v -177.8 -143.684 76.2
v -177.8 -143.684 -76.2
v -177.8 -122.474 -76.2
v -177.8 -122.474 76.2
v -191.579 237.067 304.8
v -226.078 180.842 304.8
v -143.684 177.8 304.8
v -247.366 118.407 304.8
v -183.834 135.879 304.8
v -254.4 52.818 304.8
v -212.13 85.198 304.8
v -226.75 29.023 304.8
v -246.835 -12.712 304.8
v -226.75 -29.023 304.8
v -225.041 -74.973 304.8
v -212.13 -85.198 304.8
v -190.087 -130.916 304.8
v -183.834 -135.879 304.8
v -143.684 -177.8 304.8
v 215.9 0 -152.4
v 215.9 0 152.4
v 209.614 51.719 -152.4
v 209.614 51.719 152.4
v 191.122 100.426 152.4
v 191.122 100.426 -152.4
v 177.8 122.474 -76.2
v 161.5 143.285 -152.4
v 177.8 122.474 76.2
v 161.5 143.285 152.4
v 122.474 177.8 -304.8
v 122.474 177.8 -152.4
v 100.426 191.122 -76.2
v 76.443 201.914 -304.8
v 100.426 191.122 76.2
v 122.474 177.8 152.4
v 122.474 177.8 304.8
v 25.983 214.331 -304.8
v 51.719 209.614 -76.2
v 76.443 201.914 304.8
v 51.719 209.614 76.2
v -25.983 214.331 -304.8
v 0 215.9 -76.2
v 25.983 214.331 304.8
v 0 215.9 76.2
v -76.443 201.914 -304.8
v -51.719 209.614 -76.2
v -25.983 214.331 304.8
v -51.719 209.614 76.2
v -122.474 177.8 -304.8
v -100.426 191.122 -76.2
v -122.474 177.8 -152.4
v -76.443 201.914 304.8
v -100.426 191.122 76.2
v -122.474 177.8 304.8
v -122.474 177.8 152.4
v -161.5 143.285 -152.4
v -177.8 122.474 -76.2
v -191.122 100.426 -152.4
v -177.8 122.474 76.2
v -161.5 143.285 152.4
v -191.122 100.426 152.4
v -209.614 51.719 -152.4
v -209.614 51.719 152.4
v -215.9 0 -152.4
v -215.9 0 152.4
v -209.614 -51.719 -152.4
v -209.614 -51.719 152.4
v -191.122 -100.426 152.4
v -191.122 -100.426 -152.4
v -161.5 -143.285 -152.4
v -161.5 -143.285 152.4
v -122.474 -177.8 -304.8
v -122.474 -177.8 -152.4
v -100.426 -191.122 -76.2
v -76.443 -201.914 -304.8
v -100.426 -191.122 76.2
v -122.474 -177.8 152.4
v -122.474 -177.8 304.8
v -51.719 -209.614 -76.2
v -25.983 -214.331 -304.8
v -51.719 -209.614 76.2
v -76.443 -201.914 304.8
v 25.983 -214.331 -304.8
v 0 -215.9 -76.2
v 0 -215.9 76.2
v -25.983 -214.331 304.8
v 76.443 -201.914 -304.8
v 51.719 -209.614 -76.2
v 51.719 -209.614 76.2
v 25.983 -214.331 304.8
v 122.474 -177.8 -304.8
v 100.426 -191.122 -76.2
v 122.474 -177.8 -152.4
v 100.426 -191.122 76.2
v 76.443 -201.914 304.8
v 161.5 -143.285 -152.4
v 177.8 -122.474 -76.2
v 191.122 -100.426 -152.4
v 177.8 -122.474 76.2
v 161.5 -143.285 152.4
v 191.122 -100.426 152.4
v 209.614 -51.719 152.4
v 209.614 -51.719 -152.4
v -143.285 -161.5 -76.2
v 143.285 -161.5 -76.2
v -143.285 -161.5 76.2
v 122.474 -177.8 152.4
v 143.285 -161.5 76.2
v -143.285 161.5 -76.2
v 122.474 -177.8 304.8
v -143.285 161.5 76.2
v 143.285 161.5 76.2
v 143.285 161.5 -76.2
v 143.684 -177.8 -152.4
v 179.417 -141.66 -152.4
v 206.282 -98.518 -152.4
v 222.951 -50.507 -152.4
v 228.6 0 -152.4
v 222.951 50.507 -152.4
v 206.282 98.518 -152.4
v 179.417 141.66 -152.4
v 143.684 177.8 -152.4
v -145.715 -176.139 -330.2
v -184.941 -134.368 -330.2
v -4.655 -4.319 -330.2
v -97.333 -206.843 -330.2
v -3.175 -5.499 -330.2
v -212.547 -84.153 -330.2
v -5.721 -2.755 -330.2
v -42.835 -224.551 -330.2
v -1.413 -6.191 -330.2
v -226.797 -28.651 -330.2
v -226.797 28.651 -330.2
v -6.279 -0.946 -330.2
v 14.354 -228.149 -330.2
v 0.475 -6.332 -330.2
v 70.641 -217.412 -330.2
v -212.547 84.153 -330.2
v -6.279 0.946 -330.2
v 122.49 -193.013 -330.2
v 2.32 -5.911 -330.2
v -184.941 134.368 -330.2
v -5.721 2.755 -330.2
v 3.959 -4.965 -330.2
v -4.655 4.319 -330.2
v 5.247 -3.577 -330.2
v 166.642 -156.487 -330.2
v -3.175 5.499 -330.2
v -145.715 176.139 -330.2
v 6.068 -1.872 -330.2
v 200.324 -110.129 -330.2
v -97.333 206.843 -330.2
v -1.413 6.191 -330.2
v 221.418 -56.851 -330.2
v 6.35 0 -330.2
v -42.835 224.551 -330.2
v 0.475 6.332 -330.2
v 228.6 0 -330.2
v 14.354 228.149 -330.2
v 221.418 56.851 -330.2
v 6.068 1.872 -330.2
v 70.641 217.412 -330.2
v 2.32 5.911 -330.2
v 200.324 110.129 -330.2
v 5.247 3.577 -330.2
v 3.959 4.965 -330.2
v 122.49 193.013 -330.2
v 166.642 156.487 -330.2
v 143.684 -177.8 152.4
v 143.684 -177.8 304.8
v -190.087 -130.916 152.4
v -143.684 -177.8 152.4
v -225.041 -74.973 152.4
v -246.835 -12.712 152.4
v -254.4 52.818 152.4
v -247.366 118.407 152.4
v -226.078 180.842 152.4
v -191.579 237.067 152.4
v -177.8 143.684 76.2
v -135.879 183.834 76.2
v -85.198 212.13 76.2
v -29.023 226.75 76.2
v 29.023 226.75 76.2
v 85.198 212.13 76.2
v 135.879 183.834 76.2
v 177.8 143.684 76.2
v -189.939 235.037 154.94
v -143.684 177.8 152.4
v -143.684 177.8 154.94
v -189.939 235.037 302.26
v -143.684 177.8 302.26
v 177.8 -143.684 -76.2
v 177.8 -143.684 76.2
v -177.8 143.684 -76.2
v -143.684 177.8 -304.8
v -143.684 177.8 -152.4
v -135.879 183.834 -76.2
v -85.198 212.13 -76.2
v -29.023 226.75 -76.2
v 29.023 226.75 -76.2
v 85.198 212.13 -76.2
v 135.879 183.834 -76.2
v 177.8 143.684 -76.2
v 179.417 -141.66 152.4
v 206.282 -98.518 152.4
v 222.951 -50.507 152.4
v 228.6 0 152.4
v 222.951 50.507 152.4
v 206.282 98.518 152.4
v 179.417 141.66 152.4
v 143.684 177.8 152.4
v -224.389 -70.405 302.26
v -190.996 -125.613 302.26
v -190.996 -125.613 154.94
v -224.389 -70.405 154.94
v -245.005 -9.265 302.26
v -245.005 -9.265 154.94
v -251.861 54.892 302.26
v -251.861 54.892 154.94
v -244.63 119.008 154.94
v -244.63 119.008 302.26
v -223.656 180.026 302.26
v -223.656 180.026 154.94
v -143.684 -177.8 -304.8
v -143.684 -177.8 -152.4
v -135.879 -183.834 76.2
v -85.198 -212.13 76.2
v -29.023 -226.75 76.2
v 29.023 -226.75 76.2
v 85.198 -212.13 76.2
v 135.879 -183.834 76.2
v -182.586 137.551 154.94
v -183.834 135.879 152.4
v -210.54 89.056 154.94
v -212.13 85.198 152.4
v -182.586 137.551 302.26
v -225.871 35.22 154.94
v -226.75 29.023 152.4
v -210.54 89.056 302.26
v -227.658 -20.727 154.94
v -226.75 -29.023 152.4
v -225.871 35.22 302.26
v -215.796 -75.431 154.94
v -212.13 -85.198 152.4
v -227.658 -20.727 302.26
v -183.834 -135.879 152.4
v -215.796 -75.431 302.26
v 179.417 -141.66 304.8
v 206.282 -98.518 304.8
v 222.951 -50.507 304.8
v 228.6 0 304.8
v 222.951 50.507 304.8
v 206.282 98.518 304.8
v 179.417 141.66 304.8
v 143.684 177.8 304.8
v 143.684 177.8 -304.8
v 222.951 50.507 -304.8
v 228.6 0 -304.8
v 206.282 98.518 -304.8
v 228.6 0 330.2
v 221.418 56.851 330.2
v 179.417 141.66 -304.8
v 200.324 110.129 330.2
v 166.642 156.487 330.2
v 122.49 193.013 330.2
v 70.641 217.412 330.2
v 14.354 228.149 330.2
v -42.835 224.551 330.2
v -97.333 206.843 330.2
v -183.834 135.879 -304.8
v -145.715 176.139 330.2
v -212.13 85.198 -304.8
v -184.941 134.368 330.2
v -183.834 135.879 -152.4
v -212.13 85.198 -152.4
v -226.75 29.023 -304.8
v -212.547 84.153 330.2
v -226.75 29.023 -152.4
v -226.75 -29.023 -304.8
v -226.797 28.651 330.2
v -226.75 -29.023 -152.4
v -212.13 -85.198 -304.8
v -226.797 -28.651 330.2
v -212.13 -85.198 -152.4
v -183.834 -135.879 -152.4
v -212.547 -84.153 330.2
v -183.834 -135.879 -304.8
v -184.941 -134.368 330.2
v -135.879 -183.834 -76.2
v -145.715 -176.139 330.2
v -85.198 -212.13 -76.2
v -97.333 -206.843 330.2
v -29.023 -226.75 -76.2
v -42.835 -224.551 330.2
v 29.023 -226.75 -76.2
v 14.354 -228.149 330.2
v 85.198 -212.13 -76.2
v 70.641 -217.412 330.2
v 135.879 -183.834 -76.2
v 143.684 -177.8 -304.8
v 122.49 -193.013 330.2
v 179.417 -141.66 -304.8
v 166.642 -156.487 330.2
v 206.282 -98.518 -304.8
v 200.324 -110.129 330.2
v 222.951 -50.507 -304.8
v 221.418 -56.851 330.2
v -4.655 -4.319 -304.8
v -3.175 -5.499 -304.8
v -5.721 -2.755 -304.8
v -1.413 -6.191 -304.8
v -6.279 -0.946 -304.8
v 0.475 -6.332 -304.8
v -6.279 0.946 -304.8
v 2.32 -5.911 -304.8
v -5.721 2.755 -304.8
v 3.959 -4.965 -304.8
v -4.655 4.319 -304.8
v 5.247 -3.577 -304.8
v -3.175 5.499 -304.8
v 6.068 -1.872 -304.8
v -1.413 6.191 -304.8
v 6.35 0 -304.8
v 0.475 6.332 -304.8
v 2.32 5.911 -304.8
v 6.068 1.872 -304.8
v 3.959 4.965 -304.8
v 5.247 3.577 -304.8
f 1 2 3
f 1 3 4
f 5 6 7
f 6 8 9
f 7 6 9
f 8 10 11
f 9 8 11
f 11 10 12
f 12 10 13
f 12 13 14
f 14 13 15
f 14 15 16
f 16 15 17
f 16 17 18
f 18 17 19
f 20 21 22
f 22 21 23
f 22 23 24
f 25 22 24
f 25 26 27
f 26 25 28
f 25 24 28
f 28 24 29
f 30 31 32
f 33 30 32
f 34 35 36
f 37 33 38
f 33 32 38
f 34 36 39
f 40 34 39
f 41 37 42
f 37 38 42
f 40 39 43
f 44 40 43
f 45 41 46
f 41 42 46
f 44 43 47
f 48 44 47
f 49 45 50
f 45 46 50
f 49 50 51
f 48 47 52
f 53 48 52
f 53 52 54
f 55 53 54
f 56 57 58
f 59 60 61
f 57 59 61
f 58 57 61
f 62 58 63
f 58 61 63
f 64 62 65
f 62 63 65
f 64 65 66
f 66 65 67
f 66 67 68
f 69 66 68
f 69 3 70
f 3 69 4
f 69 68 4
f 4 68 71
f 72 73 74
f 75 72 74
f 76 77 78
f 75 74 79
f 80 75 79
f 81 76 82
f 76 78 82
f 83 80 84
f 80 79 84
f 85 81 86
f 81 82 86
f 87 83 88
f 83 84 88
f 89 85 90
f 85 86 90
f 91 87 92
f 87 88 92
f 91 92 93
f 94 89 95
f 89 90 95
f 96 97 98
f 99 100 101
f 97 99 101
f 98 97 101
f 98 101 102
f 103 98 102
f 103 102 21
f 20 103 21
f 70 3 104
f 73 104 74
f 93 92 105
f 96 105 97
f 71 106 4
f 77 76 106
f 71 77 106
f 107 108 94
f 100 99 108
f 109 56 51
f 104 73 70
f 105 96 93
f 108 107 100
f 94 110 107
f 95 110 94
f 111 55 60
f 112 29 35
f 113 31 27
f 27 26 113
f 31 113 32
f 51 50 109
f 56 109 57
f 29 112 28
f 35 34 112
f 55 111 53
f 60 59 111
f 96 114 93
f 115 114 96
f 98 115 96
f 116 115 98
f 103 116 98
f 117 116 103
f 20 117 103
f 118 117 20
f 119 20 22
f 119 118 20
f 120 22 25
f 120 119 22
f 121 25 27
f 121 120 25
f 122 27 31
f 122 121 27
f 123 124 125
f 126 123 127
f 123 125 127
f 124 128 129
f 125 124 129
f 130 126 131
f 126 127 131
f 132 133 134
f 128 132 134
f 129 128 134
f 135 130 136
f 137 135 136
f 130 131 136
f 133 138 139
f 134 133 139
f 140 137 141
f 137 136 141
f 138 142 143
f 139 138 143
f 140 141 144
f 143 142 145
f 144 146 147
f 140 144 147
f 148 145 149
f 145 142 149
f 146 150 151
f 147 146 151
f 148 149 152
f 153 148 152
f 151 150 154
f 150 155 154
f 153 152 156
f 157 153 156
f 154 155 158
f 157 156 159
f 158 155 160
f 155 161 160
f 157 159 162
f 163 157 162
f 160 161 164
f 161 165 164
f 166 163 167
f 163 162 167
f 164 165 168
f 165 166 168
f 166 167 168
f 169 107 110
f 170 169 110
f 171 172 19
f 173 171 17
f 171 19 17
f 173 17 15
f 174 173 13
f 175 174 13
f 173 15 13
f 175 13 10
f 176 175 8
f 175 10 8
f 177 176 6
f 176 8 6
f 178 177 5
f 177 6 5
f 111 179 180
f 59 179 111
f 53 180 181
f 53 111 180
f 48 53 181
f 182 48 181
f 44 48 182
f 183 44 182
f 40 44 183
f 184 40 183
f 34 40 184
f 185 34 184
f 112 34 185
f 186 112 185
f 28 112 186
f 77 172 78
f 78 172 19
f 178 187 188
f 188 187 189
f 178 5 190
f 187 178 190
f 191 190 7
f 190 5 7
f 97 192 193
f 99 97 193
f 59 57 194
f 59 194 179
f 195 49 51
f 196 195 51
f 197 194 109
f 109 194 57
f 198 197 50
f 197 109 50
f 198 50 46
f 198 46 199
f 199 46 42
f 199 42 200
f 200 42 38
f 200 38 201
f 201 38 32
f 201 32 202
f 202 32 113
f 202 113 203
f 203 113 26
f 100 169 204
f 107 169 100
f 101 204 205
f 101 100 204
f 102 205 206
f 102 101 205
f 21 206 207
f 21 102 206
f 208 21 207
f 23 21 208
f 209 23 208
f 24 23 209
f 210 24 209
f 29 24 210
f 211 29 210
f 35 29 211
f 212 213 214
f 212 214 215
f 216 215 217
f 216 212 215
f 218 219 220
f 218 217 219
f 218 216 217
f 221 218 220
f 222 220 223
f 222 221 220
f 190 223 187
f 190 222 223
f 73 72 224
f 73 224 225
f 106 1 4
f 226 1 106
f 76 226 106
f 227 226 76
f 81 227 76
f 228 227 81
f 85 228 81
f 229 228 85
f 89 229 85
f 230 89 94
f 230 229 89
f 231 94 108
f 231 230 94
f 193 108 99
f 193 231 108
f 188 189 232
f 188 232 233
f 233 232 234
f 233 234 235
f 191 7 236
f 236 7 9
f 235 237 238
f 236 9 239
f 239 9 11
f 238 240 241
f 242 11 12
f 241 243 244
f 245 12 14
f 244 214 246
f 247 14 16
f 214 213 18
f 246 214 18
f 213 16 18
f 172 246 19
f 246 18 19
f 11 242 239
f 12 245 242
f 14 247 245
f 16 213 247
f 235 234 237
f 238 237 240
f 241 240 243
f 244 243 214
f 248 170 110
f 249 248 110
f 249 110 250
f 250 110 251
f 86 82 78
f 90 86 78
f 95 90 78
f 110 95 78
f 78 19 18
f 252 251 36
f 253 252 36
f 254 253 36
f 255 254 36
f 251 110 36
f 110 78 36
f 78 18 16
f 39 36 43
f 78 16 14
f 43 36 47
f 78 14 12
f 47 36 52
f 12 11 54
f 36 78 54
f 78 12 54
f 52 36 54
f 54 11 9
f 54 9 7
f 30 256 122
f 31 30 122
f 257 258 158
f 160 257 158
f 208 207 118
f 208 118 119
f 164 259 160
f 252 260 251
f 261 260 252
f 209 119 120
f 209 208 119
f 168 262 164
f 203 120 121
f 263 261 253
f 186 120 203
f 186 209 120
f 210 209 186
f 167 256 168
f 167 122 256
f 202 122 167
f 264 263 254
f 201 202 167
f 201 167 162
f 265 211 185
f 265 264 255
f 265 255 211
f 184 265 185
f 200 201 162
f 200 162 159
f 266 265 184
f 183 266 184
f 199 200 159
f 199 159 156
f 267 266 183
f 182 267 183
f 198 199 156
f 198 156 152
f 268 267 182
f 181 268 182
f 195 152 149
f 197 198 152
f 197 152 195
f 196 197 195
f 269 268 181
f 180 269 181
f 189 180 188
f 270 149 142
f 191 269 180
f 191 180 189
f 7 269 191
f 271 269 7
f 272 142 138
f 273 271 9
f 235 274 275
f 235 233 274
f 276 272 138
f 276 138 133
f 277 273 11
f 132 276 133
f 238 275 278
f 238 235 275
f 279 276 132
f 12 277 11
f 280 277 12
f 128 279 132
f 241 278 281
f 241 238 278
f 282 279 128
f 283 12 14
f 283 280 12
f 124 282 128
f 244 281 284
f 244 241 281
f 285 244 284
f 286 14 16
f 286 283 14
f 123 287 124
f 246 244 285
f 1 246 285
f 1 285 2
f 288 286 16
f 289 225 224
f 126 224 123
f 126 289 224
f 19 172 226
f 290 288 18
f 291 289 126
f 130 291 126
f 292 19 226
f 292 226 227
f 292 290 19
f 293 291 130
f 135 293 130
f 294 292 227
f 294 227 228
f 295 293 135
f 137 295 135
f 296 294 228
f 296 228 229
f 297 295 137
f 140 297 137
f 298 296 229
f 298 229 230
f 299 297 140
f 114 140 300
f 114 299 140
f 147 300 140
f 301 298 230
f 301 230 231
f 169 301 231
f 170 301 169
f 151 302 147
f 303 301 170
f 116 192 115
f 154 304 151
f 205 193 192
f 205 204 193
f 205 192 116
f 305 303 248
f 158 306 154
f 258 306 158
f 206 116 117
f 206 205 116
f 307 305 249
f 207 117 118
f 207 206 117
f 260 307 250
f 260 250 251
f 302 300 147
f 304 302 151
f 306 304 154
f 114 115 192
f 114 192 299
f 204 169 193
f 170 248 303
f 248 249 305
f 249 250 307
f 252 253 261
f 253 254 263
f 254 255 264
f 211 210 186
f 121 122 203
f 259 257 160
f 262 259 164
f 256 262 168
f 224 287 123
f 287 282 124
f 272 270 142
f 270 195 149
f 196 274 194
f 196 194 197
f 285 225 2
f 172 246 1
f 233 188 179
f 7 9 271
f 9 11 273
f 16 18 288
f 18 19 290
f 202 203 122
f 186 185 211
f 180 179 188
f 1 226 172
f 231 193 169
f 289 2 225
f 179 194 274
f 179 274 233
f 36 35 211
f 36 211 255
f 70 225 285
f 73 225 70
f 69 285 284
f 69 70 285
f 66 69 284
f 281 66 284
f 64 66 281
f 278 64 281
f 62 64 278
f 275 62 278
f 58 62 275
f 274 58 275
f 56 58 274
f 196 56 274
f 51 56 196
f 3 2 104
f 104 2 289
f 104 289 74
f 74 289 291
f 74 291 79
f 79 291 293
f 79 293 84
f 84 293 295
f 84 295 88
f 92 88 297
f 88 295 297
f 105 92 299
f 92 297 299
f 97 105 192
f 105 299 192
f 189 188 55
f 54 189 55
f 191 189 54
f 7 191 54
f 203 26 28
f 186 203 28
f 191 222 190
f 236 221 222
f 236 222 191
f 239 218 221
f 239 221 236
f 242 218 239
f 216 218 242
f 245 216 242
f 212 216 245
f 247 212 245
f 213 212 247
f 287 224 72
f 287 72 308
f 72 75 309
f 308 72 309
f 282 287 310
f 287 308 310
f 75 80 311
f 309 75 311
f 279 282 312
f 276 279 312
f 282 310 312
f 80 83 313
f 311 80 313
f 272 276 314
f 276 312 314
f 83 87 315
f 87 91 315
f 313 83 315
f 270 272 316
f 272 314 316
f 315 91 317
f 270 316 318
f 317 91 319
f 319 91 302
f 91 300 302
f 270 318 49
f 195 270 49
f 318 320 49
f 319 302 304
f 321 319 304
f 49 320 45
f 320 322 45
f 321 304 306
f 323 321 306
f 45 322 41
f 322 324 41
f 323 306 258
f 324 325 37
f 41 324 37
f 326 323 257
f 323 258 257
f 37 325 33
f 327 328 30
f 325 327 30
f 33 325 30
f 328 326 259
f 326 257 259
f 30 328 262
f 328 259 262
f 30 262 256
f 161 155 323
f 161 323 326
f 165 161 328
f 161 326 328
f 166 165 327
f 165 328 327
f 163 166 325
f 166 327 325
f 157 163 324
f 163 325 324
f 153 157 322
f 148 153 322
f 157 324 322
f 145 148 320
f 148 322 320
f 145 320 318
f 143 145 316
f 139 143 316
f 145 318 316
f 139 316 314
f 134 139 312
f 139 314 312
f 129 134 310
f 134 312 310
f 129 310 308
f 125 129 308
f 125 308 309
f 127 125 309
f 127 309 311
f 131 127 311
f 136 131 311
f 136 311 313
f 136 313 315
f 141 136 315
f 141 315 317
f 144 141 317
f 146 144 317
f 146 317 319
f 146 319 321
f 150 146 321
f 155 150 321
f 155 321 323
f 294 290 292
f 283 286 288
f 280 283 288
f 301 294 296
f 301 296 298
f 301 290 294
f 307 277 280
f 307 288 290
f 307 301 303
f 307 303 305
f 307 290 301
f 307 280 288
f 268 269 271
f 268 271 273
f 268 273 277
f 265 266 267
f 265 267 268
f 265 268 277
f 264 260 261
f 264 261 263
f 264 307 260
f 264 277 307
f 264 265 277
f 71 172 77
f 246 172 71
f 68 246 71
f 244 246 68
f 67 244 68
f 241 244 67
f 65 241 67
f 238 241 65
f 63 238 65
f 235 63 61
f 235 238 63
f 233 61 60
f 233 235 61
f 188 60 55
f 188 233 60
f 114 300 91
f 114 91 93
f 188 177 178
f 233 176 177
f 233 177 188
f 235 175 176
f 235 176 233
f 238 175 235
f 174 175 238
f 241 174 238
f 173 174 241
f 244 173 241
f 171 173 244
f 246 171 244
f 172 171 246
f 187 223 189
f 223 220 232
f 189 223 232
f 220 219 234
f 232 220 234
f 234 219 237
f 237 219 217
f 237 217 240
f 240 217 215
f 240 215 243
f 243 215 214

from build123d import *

# Parameters (mm, degrees)
F0_R          = 228.6
F1_DEPTH      = 330.2
F1_DEPTH_BACK = 330.2
F2_T          = -12.7
F6_W          = 355.6
F6_H          = 152.4
F7_DEPTH      = 457.2
F8_W          = 355.6
F8_H          = 152.4
F9_DEPTH      = 457.2
F10_W         = 355.6
F10_H         = 152.4
F11_DEPTH     = 457.2
F13_DEPTH     = 152.4
F14_T         = -2.54
F15_R         = 228.6
F16_DEPTH     = 25.4
F17_R         = 228.6
F18_DEPTH     = 25.4
F19_R         = 6.35
F20_DEPTH     = 25.401


with BuildPart() as f1:
    # F0 (on Top) → F1 (new body, two sides)
    with BuildSketch(Plane.XY) as f1_sk:
        Circle(F0_R)
    extrude(amount=F1_DEPTH)
    extrude(f1_sk.sketch, amount=-F1_DEPTH_BACK)

    # F2
    f2_openings = [f1.faces().sort_by_distance(p)[0] for p in [
        (0, 0, 330.2),
        (0, 0, -330.2),
    ]]
    offset(amount=F2_T, openings=f2_openings)

    # F6 (on offset) → F7 (cut)
    with BuildSketch(Plane.YZ.offset(228.6)):
        with Locations((0, -228.6)):
            Rectangle(F6_W, F6_H)
    extrude(amount=-F7_DEPTH, mode=Mode.SUBTRACT)

    # F8 (on offset) → F9 (cut)
    with BuildSketch(Plane.YZ.offset(-228.6)):
        with Locations((0, 228.6)):
            Rectangle(F8_W, F8_H)
    extrude(amount=F9_DEPTH, mode=Mode.SUBTRACT)

    # F10 (on offset) → F11 (cut)
    with BuildSketch(Plane.XZ.offset(228.6)):
        Rectangle(F10_W, F10_H)
    extrude(amount=-F11_DEPTH, mode=Mode.SUBTRACT)



with BuildPart() as f13:
    # F12 (on face) → F13 (new body)
    with BuildSketch(Plane(origin=(0, 0, 304.8), x_dir=(1, 0, 0), z_dir=(0, 0, -1))):
        with BuildLine():
            Line((-191.578797, -237.066667), (-143.684098, -177.8))
            ThreePointArc((-143.684098, -177.8), (-228.6, 0), (-143.684098, 177.8))
            ThreePointArc((-143.684098, 177.8), (-252.435804, -19.843009), (-191.578797, -237.066667))
        make_face()
    extrude(amount=F13_DEPTH)

    # F14
    f14_openings = [f13.faces().sort_by_distance(p)[0] for p in [
        (-167.631448, 207.433333, 228.6),
        (-228.6, 0, 228.6),
    ]]
    offset(amount=F14_T, openings=f14_openings)


with BuildPart() as f1_1:
    add(f1.part)

    add(f13.part)  # F16 merges F13
    # F15 (on face) → F16 (join)
    with BuildSketch(Plane.XY.offset(330.2)):
        Circle(F15_R)
    extrude(amount=-F16_DEPTH)

    # F17 (on face) → F18 (join)
    with BuildSketch(Plane(origin=(0, 0, -330.2), x_dir=(1, 0, 0), z_dir=(0, 0, -1))):
        Circle(F17_R)
    extrude(amount=-F18_DEPTH)

    # F19 (on face) → F20 (cut, through all)
    with BuildSketch(Plane.XY.offset(-304.8)):
        Circle(F19_R)
    extrude(amount=-F20_DEPTH, mode=Mode.SUBTRACT)


solid = f1_1.part
